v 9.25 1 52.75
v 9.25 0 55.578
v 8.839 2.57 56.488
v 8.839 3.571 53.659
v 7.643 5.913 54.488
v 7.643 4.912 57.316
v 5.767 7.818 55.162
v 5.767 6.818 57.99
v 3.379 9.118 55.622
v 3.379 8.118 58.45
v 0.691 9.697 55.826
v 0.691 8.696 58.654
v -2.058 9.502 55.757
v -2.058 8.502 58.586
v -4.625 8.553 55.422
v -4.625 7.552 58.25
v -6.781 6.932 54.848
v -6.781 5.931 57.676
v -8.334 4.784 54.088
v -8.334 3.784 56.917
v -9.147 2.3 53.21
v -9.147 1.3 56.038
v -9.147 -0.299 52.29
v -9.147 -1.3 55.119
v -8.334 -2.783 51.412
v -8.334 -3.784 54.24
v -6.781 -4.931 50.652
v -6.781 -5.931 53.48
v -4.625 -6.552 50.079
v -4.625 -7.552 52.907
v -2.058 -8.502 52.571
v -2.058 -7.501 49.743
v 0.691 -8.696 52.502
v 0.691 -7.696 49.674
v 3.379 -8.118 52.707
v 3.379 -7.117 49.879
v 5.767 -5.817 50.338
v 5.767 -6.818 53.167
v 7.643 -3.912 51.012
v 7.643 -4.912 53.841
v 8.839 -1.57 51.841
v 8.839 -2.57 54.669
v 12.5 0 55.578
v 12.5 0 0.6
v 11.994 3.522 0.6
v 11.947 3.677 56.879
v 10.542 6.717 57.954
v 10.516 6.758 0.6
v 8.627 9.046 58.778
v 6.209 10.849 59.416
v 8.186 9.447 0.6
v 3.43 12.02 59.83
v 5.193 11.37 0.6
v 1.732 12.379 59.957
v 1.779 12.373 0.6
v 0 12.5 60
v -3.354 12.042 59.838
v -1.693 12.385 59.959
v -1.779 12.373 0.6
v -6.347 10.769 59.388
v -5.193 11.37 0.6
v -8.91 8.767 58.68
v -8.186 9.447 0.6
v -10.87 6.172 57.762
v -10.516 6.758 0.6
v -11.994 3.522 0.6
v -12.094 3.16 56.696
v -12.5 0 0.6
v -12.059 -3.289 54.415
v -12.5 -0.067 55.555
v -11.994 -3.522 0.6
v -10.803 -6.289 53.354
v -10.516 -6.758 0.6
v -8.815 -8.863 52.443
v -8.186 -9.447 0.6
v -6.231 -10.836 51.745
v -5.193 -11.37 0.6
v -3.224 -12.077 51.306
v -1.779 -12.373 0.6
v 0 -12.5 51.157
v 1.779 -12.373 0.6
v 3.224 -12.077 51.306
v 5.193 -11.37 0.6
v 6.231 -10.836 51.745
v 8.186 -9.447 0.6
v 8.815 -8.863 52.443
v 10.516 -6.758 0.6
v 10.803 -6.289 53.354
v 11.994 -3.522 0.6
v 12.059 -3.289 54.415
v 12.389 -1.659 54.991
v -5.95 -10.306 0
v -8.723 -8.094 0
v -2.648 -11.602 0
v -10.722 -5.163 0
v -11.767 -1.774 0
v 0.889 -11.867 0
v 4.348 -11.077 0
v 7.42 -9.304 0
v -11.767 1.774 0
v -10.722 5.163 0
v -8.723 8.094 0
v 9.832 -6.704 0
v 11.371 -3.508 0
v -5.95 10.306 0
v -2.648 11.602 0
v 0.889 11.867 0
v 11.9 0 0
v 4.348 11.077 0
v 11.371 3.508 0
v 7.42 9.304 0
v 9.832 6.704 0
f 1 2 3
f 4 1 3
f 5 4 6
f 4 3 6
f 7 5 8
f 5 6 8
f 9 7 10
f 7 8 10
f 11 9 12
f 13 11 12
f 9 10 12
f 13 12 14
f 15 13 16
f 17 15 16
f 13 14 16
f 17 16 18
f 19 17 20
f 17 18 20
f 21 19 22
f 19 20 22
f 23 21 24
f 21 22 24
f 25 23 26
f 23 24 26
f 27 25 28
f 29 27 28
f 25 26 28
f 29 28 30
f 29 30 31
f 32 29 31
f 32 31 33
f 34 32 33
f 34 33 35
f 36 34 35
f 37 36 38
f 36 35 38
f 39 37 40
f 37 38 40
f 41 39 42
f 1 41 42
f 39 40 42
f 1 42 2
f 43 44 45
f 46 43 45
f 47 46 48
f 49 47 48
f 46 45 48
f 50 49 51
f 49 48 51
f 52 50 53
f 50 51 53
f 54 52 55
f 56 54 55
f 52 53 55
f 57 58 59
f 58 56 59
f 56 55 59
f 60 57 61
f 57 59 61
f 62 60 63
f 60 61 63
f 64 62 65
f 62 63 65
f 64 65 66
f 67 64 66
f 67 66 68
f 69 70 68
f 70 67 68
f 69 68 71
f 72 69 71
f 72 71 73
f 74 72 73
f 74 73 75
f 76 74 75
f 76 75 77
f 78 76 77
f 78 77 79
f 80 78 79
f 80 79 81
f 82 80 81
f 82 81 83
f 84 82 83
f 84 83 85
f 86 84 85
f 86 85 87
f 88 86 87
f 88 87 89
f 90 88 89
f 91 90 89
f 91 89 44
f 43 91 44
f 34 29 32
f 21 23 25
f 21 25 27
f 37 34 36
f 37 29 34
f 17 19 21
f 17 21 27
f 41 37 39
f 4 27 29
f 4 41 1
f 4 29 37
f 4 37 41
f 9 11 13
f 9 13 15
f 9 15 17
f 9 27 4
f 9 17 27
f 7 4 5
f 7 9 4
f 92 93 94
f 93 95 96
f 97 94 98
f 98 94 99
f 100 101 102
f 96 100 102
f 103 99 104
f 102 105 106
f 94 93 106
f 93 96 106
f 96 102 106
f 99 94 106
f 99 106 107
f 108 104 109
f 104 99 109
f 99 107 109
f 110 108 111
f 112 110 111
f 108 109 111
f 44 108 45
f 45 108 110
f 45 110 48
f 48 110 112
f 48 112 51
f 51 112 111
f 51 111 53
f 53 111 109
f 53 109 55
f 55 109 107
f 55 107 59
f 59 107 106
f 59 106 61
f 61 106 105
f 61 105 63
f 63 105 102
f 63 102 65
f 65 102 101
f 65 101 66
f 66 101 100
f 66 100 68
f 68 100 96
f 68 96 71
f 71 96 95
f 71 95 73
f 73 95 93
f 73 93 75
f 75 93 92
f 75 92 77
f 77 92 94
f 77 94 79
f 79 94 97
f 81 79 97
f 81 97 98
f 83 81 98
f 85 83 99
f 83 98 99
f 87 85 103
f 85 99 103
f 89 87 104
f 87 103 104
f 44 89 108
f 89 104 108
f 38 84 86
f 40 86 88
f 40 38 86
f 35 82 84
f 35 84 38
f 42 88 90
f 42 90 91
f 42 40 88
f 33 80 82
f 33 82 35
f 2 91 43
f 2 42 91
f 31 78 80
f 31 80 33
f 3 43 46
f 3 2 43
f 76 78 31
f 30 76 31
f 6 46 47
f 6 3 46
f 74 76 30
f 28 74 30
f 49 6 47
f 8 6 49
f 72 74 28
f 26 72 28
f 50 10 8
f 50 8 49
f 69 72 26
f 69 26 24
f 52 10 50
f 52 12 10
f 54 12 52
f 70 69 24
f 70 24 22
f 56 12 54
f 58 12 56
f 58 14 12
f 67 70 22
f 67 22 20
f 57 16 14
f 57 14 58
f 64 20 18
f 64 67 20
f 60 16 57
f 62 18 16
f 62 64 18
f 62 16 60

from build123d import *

# Parameters (mm, degrees)
F0_R          = 12.5
F1_DEPTH      = 60
F3_DEPTH      = 12.501
F3_DEPTH_BACK = 12.501
F4_R          = 9.25
F5_DEPTH      = 3
F6_SIZE       = 0.6


with BuildPart() as f1:
    # F0 (on Top) → F1 (new body)
    with BuildSketch(Plane.XY):
        Circle(F0_R)
    extrude(amount=F1_DEPTH)

    # F2 (on Right) → F3 (cut, two sides)
    with BuildSketch(Plane.YZ) as f3_sk:
        Polygon((12.5, 60), (-12.5, 60), (-12.5, 51.156578049), align=None)
    extrude(amount=-F3_DEPTH, mode=Mode.SUBTRACT)
    extrude(f3_sk.sketch, amount=F3_DEPTH_BACK, mode=Mode.SUBTRACT)

    # F4 (on face) → F5 (cut)
    with BuildSketch(Plane(origin=(0, -17.4736202127, 49.3972251624), x_dir=(1, 0, 0), z_dir=(0, -0.3334870921, 0.9427546655))):
        with Locations((0, 18.5346419929)):
            Circle(F4_R)
    extrude(amount=-F5_DEPTH, mode=Mode.SUBTRACT)

    # F6
    f6_edges = [f1.edges().sort_by_distance(p)[0] for p in [
        (-12.5, 0, 0),
    ]]
    chamfer(f6_edges, length=F6_SIZE)


solid = f1.part
